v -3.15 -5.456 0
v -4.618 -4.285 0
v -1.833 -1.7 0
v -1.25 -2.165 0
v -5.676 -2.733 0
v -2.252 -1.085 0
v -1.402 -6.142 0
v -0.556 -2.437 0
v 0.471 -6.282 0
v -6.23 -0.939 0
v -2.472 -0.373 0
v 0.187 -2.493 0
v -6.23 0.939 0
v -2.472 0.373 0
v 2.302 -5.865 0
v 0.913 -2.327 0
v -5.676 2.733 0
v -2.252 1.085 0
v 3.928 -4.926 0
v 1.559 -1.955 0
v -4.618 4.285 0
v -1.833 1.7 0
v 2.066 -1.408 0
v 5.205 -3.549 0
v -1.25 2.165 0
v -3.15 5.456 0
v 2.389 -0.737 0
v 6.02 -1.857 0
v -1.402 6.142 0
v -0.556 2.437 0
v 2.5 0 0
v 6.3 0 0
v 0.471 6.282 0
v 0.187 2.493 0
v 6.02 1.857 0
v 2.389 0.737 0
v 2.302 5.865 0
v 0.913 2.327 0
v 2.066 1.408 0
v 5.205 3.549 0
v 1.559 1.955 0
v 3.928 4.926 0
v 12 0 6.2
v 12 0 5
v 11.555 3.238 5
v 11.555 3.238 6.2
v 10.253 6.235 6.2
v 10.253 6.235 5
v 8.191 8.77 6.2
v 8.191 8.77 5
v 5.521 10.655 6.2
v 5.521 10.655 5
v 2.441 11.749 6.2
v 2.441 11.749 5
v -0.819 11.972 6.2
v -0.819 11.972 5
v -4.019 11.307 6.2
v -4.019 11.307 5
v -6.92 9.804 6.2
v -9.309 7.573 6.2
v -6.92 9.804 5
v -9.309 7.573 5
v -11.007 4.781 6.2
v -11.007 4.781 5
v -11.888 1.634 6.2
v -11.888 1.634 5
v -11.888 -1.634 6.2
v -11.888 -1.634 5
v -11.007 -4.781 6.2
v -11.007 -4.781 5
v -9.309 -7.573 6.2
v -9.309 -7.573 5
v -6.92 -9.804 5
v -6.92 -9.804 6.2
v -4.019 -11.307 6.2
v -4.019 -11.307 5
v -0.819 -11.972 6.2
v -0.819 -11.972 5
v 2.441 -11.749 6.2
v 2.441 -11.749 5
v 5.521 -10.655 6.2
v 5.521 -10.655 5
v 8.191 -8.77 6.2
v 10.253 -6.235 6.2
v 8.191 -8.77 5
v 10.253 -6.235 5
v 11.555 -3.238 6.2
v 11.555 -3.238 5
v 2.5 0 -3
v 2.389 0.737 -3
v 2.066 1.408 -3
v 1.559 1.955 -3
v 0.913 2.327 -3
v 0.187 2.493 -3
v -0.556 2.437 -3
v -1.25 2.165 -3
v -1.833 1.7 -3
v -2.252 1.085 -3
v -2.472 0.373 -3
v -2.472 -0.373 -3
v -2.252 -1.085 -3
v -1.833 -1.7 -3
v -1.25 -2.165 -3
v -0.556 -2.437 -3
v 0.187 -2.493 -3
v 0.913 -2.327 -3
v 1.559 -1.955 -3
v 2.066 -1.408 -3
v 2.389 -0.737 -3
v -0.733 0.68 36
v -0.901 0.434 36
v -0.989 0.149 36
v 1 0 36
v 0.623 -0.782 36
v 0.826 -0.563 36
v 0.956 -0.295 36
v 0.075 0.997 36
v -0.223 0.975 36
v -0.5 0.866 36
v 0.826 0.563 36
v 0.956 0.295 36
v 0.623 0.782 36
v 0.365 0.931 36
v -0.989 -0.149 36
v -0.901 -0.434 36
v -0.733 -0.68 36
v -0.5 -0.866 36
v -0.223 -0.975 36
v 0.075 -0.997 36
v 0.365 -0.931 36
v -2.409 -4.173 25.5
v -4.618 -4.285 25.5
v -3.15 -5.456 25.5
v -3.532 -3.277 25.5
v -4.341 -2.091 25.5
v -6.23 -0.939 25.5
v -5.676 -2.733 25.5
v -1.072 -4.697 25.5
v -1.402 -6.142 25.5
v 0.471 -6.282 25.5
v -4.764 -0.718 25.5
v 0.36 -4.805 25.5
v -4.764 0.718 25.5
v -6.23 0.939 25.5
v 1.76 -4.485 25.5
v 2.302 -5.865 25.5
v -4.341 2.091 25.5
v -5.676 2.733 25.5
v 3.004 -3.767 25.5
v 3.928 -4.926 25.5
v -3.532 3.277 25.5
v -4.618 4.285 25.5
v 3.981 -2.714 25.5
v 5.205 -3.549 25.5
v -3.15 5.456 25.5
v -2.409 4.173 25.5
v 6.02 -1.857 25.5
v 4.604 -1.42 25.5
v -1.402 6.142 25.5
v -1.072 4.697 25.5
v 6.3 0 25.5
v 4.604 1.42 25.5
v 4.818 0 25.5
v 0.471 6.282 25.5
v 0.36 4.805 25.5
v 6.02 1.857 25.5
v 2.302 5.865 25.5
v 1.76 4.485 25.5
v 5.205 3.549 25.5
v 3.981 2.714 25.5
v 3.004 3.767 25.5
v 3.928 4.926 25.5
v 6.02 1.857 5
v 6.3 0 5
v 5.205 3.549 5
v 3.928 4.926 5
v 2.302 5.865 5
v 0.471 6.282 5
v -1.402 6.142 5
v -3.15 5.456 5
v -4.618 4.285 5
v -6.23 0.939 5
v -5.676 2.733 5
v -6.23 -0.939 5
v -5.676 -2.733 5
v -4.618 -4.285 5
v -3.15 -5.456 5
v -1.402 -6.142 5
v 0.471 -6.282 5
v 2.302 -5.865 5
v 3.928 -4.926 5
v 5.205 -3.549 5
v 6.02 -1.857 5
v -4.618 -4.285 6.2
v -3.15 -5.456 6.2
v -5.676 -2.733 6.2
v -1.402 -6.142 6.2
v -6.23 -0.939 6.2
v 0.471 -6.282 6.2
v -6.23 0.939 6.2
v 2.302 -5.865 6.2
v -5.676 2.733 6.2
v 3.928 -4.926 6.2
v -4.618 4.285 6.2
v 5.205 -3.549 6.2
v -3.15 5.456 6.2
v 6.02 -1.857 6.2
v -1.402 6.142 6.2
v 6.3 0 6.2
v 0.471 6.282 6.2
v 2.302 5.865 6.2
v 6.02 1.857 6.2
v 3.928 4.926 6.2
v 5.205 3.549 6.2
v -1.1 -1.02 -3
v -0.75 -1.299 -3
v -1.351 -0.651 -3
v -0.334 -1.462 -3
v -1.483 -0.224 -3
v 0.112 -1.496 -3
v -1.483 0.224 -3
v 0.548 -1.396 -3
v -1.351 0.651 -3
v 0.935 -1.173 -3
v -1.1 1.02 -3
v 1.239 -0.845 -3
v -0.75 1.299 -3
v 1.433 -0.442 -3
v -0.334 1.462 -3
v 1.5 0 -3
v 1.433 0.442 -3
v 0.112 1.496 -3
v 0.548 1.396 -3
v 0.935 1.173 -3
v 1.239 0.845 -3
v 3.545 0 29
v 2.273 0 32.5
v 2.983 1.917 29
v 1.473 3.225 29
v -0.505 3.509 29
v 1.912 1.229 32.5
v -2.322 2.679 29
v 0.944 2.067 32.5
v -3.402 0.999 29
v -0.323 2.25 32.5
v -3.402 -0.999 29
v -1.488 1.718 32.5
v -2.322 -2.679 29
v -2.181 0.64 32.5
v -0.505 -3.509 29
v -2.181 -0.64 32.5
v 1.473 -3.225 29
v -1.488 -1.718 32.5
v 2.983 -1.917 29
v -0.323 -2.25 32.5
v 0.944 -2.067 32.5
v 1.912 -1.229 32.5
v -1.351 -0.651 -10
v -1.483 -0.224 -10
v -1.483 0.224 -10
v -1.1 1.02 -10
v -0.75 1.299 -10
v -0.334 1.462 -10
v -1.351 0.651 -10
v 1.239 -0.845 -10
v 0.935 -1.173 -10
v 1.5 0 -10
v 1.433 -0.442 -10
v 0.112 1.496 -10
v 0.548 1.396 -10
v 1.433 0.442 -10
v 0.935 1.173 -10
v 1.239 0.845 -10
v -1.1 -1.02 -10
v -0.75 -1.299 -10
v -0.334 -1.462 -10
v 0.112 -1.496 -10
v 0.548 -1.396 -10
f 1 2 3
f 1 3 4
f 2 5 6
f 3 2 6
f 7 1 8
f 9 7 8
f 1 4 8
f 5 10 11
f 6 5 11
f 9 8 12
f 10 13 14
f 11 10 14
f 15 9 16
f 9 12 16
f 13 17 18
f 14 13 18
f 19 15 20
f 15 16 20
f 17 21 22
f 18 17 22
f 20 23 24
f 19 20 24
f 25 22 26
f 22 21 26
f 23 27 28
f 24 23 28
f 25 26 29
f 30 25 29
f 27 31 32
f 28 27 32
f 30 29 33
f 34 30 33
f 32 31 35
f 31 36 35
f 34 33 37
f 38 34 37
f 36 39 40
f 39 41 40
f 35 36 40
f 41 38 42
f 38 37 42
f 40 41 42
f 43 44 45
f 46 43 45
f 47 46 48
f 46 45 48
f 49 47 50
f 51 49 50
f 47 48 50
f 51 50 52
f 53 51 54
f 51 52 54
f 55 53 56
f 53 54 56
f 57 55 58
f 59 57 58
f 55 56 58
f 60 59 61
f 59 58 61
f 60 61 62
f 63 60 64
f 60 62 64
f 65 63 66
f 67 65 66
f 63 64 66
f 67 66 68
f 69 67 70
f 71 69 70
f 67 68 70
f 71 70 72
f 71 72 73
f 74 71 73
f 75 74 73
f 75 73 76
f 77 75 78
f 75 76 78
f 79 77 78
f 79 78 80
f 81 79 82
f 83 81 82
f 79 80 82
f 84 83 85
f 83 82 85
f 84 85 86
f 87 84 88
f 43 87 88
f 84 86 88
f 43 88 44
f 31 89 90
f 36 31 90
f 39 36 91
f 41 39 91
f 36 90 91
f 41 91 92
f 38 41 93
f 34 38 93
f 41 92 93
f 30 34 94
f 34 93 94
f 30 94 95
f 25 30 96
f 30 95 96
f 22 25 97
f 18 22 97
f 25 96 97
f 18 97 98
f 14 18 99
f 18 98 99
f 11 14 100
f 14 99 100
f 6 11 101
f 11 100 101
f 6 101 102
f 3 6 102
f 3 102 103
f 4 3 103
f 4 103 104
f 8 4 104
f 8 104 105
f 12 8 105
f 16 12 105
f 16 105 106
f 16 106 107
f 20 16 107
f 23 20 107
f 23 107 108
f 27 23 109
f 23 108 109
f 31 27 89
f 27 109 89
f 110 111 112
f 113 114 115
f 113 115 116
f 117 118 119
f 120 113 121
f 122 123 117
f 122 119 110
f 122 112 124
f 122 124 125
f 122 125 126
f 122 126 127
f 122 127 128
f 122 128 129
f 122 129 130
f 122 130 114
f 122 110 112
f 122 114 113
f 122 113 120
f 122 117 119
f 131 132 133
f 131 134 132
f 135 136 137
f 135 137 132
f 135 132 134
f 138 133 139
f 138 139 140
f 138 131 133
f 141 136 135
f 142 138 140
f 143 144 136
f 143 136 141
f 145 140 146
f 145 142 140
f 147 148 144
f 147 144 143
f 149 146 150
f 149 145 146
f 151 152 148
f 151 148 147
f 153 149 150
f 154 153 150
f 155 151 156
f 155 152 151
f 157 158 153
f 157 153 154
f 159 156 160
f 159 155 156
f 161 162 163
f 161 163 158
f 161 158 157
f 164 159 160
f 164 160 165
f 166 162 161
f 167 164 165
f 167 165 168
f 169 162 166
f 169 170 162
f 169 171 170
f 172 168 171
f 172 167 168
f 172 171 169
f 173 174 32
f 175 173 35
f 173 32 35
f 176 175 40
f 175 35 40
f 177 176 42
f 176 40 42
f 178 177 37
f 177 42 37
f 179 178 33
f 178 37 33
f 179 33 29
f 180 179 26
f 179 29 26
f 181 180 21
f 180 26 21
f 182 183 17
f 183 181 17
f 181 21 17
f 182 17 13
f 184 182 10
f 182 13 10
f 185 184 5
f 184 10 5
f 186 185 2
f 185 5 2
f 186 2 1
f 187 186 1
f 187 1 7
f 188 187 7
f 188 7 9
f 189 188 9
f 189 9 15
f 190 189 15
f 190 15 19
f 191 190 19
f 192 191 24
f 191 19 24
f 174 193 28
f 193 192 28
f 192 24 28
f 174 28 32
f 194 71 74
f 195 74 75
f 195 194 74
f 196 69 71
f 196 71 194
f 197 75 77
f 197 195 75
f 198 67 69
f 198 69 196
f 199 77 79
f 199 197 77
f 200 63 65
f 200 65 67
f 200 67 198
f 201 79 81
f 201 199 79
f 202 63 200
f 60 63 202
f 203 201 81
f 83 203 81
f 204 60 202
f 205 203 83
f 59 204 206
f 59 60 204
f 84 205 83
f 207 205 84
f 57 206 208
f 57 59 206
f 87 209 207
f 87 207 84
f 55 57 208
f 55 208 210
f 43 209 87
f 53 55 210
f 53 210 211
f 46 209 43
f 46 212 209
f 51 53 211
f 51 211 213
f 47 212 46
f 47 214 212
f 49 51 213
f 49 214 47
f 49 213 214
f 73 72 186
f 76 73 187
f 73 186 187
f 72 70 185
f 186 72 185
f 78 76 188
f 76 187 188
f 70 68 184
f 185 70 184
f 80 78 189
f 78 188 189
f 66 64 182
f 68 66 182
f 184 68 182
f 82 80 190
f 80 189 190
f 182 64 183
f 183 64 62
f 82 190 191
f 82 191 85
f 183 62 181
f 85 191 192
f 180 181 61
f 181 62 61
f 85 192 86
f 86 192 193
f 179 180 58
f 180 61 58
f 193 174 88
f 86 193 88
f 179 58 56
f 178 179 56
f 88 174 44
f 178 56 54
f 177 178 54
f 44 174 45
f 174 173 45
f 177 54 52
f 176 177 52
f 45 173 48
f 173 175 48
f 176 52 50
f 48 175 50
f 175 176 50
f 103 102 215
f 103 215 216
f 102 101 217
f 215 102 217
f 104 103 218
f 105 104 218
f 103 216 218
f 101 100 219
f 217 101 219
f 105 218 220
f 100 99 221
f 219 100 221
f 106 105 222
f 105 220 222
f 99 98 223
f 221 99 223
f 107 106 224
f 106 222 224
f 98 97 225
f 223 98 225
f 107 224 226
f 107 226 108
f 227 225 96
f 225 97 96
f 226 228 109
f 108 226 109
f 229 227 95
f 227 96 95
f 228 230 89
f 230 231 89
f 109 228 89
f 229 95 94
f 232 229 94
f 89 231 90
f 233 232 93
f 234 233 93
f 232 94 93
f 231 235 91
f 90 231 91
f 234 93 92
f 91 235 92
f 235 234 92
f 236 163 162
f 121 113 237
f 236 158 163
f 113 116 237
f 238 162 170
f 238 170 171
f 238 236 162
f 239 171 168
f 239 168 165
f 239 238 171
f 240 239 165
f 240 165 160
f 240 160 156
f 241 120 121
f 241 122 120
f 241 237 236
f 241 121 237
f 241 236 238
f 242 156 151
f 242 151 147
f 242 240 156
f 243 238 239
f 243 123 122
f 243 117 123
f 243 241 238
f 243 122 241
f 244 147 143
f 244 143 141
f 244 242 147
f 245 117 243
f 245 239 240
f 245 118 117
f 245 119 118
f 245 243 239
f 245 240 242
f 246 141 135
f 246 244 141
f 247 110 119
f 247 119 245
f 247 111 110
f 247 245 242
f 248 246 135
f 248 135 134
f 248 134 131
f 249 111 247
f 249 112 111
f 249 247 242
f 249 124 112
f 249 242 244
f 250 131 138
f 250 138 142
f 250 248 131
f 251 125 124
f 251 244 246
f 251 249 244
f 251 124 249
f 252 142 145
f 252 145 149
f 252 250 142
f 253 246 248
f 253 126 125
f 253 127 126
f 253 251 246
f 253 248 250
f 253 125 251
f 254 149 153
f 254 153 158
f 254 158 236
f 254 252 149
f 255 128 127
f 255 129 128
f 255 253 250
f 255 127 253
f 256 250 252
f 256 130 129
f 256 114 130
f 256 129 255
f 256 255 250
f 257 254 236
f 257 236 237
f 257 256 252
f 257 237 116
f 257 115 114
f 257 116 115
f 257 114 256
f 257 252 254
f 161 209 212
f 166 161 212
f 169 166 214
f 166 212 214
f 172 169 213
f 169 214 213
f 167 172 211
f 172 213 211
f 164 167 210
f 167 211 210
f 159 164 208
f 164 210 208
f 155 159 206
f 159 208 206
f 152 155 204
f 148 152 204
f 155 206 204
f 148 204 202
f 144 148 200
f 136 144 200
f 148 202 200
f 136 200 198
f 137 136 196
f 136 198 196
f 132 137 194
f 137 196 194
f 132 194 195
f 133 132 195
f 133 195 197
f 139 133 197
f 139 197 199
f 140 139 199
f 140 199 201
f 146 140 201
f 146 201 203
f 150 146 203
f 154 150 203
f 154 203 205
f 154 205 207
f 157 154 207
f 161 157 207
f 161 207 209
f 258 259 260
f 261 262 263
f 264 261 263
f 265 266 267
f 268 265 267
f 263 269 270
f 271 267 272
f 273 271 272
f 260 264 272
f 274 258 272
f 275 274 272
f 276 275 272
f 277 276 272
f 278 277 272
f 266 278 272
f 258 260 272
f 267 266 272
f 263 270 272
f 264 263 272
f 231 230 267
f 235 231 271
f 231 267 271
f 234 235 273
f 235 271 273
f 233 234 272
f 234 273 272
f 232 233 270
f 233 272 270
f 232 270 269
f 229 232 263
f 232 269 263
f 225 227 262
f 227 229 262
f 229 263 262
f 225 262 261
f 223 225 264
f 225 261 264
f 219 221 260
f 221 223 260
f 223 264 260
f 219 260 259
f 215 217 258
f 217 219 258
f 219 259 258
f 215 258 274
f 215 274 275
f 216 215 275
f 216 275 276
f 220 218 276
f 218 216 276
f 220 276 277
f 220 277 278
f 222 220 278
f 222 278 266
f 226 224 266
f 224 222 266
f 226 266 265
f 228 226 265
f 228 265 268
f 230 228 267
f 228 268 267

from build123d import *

# Parameters (mm, degrees)
CYLINDER002_R     = 2.5
CYLINDER002_DEPTH = 3
CYLINDER001_R     = 12
CYLINDER001_DEPTH = 1.2
CYLINDER_R        = 6.3
CYLINDER_DEPTH    = 25.5
CYLINDER003_R     = 1.5
CYLINDER003_DEPTH = 10


with BuildPart() as cylinder002:
    # Cylinder002 → Cylinder002 (new body)
    with BuildSketch(Plane.XY.offset(-3)):
        Circle(CYLINDER002_R)
    extrude(amount=CYLINDER002_DEPTH)


with BuildPart() as cylinder001:
    # Cylinder001 → Cylinder001 (new body)
    with BuildSketch(Plane.XY.offset(5)):
        Circle(CYLINDER001_R)
    extrude(amount=CYLINDER001_DEPTH)


with BuildPart() as cylinder:
    # Cylinder → Cylinder (new body)
    with BuildSketch(Plane.XY):
        Circle(CYLINDER_R)
    extrude(amount=CYLINDER_DEPTH)


with BuildPart() as cylinder003:
    # Cylinder003 → Cylinder003 (new body)
    with BuildSketch(Plane.XY.offset(-10)):
        Circle(CYLINDER003_R)
    extrude(amount=CYLINDER003_DEPTH)


with BuildPart() as assembly:
    # Cone → Cone (revolve)
    with BuildSketch(Plane(origin=(0, 0, 25), x_dir=(1, 0, 0), z_dir=(0, -1, 0))):
        Polygon((0, 0), (5, 0), (1, 11), (0, 11), align=None)
    revolve(axis=Axis((0, 0, 25), (0, 0, 1)))

    # Fusion: union Cylinder002, Cylinder001, Cylinder, Cylinder003
    add(cylinder002.part)
    add(cylinder001.part)
    add(cylinder.part)
    add(cylinder003.part)


solid = assembly.part
